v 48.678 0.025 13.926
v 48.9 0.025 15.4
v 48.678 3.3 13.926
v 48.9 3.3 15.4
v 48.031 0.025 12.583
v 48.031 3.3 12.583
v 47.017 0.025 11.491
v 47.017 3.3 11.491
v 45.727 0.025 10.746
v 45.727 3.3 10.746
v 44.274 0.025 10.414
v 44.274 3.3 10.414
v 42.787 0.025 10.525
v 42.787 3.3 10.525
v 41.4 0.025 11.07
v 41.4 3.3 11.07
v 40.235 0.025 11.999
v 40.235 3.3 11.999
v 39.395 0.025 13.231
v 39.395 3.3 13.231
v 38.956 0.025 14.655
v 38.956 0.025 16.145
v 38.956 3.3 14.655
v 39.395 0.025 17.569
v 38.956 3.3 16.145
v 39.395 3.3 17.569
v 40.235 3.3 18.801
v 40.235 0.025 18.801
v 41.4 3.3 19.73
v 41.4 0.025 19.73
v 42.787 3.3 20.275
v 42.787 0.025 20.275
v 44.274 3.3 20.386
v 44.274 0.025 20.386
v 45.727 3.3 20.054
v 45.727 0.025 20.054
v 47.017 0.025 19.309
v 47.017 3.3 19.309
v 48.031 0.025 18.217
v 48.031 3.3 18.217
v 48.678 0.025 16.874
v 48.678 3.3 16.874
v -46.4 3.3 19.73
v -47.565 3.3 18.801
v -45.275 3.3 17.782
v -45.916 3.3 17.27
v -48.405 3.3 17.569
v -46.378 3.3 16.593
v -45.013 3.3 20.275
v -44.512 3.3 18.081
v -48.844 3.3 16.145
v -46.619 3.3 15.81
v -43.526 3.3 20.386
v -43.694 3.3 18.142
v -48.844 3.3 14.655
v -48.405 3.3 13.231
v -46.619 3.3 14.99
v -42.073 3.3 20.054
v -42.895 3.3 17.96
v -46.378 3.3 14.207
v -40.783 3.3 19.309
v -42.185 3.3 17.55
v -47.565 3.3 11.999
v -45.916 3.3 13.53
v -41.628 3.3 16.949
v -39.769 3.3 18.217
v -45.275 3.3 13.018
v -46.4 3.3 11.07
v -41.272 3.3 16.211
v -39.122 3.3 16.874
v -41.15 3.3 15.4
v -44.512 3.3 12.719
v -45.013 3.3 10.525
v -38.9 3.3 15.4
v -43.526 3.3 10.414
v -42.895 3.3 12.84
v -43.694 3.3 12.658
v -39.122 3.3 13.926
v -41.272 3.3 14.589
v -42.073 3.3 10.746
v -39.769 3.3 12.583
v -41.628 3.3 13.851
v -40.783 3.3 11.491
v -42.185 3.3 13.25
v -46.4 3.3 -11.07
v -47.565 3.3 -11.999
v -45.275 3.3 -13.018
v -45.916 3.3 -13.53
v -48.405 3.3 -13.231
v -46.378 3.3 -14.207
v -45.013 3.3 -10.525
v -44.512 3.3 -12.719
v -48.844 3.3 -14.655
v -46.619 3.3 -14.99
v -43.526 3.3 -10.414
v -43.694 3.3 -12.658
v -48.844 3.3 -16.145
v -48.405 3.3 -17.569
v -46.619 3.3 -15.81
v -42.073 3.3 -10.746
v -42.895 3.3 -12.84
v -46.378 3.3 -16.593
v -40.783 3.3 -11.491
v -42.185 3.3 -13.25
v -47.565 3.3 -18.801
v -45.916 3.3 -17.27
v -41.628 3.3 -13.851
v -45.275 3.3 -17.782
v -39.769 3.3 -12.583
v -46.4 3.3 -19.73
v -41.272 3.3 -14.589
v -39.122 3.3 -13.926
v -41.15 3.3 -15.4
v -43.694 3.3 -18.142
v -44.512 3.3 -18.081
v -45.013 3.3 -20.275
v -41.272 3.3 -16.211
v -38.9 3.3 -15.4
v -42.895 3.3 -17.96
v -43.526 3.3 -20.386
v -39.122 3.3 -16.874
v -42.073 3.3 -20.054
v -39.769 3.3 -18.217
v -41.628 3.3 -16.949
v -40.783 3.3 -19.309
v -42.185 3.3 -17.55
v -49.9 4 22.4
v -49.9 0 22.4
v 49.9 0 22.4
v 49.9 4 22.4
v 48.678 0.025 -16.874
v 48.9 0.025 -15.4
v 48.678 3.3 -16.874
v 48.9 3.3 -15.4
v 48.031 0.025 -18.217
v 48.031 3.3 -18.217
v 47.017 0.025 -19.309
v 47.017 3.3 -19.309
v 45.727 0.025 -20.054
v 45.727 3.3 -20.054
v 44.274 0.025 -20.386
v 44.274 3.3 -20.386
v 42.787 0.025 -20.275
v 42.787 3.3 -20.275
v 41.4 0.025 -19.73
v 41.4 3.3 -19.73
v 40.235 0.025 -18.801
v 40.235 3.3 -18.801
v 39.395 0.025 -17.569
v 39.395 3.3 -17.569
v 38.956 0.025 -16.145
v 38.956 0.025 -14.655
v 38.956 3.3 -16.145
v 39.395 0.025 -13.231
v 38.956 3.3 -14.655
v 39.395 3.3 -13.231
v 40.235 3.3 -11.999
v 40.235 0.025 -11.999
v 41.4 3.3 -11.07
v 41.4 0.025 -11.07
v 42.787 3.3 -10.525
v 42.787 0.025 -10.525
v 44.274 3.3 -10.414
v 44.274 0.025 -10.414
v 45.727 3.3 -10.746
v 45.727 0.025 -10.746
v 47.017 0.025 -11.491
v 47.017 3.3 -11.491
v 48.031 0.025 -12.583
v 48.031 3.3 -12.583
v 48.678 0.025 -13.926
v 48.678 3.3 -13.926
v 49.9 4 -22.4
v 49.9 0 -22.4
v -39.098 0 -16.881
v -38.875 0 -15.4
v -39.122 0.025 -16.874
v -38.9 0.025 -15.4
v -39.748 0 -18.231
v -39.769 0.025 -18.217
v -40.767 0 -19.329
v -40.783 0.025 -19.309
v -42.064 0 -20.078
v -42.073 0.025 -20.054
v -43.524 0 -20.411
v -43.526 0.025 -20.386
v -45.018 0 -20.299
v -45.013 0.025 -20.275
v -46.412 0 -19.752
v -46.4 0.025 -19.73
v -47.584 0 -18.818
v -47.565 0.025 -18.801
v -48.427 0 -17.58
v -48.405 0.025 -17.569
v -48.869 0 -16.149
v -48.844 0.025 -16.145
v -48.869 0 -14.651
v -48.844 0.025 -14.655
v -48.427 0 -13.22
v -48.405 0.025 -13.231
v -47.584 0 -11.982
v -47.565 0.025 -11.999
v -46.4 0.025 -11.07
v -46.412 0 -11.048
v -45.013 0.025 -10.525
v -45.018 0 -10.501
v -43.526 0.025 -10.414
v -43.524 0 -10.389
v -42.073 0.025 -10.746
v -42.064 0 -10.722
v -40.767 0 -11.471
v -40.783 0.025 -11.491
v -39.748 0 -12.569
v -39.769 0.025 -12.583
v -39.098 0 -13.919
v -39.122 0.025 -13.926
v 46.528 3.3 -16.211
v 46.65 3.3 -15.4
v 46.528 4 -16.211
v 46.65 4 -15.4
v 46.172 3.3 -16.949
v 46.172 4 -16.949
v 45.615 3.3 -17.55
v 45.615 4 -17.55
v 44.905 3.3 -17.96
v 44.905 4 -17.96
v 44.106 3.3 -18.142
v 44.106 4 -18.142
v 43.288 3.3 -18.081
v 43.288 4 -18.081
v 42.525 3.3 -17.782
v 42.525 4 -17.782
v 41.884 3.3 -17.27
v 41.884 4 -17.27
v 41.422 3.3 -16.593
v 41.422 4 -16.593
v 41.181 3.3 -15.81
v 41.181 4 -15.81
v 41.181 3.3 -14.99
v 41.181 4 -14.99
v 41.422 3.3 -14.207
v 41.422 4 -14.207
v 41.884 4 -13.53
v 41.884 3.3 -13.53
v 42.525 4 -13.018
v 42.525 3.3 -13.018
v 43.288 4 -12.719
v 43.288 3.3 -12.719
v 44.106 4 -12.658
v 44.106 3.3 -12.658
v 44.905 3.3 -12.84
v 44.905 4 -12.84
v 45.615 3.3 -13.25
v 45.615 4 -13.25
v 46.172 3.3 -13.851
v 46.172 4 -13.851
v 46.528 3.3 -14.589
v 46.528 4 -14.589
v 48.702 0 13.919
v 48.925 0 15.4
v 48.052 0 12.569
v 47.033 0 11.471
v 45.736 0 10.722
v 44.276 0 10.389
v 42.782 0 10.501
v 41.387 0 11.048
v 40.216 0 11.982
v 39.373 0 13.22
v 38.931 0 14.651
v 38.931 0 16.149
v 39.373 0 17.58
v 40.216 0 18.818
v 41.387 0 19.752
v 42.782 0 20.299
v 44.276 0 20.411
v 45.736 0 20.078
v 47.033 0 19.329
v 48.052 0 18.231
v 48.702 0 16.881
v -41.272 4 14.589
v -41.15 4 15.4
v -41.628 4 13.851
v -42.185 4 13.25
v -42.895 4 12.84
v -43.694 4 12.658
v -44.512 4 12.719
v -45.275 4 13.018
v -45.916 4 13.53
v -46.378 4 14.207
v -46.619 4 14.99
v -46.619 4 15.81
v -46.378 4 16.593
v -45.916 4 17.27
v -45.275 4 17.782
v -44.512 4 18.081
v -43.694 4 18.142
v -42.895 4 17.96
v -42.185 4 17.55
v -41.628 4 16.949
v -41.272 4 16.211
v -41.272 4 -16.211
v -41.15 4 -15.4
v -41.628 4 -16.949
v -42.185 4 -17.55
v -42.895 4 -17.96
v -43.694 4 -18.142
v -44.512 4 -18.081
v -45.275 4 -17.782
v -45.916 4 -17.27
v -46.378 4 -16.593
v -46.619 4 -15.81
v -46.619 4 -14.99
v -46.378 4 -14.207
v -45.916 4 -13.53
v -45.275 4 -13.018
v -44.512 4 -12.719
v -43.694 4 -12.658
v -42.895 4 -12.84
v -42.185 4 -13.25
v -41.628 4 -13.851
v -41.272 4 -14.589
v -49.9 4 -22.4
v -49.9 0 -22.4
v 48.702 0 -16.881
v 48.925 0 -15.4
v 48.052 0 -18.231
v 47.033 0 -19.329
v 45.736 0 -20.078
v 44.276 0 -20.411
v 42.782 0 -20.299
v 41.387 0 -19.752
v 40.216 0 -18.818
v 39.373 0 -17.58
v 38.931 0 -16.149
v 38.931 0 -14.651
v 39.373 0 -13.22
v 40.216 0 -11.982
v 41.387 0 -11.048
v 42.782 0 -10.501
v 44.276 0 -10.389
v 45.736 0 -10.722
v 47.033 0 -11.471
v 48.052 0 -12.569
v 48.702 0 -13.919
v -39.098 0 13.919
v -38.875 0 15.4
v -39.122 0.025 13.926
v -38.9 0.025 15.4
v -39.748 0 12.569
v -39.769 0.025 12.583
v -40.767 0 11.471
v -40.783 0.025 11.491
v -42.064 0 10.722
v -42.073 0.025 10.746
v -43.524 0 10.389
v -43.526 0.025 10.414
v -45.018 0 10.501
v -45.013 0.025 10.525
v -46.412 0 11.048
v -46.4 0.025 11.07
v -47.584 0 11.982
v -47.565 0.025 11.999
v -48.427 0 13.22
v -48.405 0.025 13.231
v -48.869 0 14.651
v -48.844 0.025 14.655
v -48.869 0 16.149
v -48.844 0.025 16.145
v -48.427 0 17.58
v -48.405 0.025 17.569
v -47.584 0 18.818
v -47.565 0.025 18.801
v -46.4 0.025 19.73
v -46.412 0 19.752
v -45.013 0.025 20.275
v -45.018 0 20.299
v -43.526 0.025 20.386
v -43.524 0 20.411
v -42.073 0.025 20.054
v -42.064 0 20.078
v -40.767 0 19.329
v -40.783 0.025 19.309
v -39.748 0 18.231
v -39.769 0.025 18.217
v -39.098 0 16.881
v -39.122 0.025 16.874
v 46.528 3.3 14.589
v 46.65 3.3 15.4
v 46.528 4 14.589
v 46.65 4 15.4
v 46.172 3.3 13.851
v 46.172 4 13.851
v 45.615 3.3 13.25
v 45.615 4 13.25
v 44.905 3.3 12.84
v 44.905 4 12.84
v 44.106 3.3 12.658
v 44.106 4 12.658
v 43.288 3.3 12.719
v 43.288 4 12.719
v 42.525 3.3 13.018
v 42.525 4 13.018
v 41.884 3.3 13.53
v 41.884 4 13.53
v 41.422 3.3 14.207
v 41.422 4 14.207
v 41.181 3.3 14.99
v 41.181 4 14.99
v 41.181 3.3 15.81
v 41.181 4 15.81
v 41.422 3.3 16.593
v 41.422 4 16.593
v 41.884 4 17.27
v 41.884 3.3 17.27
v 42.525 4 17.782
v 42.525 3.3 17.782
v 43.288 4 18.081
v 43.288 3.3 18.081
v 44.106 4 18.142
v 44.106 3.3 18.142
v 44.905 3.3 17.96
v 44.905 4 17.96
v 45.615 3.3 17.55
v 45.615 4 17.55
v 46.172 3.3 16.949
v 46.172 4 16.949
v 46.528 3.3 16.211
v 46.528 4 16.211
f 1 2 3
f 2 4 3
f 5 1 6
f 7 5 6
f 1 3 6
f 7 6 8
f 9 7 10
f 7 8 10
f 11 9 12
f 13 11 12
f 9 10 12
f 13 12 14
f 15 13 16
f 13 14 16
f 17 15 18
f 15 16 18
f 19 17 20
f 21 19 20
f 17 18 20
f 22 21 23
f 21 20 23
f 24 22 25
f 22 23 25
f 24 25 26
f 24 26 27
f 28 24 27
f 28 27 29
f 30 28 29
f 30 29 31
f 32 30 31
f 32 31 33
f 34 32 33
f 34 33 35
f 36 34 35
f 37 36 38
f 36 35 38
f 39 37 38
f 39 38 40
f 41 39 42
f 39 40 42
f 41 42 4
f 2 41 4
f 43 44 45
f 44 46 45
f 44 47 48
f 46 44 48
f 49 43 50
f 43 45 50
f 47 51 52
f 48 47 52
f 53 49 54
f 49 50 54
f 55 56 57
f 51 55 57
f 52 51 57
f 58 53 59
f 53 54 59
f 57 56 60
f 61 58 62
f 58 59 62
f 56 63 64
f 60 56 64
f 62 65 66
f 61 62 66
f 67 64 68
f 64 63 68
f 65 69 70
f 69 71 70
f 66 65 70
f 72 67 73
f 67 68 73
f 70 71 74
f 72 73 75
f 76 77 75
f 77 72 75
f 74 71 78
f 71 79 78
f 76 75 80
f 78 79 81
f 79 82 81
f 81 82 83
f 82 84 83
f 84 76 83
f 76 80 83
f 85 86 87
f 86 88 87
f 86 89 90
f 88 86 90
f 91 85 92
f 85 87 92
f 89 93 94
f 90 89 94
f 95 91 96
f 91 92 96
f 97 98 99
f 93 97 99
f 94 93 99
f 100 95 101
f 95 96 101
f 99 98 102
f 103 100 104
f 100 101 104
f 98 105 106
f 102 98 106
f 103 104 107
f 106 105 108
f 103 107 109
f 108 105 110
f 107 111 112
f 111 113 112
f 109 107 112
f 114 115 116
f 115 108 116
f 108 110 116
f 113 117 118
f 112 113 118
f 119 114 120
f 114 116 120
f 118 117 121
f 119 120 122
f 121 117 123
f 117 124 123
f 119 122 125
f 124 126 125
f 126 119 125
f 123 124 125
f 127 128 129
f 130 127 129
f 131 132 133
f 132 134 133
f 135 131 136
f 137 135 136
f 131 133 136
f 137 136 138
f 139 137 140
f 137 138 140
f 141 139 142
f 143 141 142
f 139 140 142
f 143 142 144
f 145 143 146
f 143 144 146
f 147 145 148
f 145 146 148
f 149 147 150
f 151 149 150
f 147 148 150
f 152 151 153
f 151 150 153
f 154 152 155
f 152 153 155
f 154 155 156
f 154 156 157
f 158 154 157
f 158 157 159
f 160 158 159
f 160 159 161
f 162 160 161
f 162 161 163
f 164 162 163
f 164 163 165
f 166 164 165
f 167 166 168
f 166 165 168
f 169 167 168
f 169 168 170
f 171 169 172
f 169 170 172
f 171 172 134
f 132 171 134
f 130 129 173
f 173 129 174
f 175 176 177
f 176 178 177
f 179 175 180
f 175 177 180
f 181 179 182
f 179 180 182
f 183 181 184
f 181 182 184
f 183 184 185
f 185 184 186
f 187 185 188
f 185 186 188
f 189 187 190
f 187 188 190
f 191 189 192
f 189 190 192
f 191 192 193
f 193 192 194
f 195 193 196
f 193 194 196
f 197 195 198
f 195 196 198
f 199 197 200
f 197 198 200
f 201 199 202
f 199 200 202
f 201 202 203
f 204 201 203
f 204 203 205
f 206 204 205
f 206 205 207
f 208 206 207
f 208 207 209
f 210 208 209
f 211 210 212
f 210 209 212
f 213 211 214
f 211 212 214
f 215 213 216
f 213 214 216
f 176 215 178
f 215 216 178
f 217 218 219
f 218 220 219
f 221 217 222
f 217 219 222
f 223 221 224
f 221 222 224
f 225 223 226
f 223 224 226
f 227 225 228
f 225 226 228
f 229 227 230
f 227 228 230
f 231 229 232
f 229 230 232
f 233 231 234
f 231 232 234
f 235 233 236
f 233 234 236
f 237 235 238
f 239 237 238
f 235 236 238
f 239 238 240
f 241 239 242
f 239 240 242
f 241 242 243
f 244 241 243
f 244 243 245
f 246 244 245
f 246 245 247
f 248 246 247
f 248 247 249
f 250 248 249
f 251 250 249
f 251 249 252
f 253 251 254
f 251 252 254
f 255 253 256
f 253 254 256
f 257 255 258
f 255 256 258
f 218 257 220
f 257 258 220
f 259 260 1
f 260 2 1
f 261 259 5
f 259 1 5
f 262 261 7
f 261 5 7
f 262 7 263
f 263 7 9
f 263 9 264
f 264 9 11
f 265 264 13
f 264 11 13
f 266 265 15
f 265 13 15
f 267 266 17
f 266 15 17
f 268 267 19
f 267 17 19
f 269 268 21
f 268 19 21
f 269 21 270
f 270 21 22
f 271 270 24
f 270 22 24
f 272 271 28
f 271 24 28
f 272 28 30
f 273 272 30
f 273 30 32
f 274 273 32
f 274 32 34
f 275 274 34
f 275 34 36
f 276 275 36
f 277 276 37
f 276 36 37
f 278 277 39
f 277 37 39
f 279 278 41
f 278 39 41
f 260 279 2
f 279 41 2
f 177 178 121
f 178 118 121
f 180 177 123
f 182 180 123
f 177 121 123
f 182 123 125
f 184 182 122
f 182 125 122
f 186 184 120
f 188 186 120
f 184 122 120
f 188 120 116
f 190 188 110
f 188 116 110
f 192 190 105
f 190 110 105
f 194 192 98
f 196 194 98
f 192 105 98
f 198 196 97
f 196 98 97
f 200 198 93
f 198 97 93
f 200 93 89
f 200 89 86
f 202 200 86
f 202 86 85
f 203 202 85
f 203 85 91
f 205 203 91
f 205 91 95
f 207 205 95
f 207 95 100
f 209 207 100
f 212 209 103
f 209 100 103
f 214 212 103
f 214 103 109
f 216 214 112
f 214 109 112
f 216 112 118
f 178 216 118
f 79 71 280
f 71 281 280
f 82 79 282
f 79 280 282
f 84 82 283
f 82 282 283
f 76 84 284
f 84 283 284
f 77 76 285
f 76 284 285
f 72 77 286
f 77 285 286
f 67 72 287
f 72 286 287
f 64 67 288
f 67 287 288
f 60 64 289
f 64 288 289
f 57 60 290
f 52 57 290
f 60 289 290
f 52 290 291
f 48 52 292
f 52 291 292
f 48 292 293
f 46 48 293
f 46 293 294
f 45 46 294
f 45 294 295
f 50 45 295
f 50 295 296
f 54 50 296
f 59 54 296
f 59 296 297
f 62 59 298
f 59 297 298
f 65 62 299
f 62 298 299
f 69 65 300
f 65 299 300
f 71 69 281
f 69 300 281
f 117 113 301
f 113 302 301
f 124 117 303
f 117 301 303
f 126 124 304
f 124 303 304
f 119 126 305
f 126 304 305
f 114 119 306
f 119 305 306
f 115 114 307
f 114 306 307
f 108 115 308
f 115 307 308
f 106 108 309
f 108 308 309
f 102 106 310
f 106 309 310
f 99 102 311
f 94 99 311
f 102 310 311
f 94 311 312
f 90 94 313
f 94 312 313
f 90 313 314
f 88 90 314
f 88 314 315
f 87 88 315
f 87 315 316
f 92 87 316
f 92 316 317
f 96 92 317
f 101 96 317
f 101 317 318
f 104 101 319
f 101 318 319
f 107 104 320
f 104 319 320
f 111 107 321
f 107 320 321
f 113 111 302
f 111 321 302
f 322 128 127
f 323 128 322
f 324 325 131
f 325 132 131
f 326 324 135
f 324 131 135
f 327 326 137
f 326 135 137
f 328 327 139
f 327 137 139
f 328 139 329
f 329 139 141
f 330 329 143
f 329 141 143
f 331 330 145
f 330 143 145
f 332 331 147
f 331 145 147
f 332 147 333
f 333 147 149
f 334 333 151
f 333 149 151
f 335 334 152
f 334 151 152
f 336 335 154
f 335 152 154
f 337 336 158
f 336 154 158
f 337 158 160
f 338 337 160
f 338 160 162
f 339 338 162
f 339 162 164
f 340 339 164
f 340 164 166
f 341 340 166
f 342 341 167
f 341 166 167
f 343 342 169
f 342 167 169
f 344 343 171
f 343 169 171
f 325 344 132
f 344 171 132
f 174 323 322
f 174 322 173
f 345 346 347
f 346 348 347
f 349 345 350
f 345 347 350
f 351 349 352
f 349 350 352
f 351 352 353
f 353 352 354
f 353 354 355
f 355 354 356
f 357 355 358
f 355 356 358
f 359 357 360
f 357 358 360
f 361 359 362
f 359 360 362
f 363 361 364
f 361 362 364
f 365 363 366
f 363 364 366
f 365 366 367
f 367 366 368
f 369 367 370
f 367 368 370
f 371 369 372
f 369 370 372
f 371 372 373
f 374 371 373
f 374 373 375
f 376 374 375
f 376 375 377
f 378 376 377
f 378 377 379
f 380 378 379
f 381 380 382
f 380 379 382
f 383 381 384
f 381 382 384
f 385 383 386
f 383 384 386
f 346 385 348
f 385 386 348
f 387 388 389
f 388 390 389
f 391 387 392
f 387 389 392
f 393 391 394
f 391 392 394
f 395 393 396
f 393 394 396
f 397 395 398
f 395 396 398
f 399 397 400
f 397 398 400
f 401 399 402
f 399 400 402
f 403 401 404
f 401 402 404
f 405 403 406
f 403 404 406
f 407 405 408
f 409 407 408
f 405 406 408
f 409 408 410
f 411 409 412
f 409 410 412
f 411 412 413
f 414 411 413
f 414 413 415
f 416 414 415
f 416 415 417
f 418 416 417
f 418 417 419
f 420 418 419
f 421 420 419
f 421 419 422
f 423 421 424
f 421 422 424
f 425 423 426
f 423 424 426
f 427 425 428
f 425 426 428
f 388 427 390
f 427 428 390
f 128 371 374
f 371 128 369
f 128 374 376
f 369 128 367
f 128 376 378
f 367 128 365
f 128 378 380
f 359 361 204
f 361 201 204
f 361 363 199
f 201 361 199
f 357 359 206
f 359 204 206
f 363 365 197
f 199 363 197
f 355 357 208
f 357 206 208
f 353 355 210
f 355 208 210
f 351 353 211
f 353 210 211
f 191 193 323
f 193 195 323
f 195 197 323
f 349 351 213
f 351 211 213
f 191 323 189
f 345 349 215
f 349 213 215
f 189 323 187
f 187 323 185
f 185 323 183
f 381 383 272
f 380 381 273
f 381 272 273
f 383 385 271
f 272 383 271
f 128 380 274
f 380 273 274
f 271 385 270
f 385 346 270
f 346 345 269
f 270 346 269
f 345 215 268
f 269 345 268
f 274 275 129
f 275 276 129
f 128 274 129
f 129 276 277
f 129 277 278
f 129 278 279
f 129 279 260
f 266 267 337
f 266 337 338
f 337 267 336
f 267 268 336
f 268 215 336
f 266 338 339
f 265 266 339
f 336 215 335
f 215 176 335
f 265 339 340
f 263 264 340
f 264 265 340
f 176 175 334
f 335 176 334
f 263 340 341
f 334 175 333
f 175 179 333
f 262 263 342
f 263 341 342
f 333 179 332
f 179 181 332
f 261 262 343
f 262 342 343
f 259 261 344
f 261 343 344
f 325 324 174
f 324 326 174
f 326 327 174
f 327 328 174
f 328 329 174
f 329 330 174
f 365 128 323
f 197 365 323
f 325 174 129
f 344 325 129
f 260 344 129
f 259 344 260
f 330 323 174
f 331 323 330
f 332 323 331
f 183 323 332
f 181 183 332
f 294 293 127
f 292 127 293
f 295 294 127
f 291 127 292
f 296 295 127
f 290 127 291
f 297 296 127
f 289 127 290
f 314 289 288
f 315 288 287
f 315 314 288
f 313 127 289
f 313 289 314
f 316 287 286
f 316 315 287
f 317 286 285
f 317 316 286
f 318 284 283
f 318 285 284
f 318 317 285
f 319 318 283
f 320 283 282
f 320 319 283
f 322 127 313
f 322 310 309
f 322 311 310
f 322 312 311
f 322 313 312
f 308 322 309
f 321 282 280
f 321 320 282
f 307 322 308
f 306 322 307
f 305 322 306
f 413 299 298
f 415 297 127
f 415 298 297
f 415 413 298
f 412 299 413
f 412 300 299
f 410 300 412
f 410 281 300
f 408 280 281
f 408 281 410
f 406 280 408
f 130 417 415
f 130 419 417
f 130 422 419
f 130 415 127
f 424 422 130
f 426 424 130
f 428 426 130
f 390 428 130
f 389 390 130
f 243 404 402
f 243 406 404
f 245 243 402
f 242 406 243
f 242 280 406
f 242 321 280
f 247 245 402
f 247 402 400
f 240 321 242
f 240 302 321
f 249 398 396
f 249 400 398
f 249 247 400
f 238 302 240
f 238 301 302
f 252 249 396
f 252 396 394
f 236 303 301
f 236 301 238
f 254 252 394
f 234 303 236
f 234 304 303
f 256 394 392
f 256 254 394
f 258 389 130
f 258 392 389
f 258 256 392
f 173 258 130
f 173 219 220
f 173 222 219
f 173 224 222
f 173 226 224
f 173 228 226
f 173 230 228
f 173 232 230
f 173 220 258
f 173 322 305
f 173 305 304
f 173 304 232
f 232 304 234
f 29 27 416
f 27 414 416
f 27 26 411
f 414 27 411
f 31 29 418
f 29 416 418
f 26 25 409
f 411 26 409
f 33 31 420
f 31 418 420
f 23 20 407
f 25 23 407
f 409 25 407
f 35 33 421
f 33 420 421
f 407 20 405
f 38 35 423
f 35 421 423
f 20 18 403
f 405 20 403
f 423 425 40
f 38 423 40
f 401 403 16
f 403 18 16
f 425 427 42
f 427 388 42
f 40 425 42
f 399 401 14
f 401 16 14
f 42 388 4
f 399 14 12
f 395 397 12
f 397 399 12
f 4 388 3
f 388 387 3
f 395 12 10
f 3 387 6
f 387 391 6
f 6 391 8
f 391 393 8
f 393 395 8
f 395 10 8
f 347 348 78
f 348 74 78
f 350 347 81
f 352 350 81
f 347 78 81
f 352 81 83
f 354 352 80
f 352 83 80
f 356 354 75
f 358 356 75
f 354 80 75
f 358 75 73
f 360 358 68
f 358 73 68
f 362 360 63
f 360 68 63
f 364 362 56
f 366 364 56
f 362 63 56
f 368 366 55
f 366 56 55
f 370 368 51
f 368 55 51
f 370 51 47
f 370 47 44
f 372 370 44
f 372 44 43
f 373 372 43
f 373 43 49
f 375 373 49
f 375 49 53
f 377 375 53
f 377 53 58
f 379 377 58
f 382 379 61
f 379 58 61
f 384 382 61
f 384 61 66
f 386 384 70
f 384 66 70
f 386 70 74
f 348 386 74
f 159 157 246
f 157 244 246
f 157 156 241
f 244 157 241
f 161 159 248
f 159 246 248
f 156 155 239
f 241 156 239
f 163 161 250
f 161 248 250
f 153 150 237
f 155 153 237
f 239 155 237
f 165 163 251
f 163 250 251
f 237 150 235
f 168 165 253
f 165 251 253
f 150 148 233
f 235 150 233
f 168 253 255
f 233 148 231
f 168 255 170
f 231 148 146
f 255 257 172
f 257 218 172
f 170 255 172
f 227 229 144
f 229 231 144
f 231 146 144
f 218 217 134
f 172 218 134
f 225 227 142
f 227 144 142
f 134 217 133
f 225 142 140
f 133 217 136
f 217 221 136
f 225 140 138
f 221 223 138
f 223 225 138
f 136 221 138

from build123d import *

# Parameters (mm, degrees)
SKETCH_1_W      = 99.8
SKETCH_1_H      = 44.8
EXTRUDE_1_DEPTH = 4


# Read off the part's stored shape, not the designer's step: M5 扁圆形螺钉的柱孔
with BuildPart() as part:
    # 草图1 → 凸台-拉伸1 (new body)
    with BuildSketch(Plane(origin=(0, 0, 0), x_dir=(1, 0, 0), z_dir=(0, 1, 0))):
        Rectangle(SKETCH_1_W, SKETCH_1_H)
    extrude(amount=EXTRUDE_1_DEPTH)

    # M5 扁圆形螺钉的柱孔 outline → M5 扁圆形螺钉的柱孔 (revolve, cut)
    with BuildSketch(Plane(origin=(43.9, 0, -15.4), x_dir=(1, 0, 0), z_dir=(0, 0, 1))):
        Polygon((2.75, 3.3), (2.75, 4), (0, 4), (0, 0), (5.025, 0), (5, 0.025), (5, 3.3), align=None)
    revolve(axis=Axis((43.9, 0, -15.4), (0, 1, 0)), mode=Mode.SUBTRACT)

    # Hole Wizard M5 2 outline → Hole Wizard M5 2 (revolve, cut)
    with BuildSketch(Plane(origin=(43.9, 0, 15.4), x_dir=(1, 0, 0), z_dir=(0, 0, 1))):
        Polygon((0, 0), (5.025, 0), (5, 0.025), (5, 3.3), (2.75, 3.3), (2.75, 4), (0, 4), align=None)
    revolve(axis=Axis((43.9, 0, 15.4), (0, 1, 0)), mode=Mode.SUBTRACT)

    # Hole Wizard M5 3 outline → Hole Wizard M5 3 (revolve, cut)
    with BuildSketch(Plane(origin=(-43.9, 0, 15.4), x_dir=(1, 0, 0), z_dir=(0, 0, 1))):
        Polygon((0, 0), (5.025, 0), (5, 0.025), (5, 3.3), (2.75, 3.3), (2.75, 4), (0, 4), align=None)
    revolve(axis=Axis((-43.9, 0, 15.4), (0, 1, 0)), mode=Mode.SUBTRACT)

    # Hole Wizard M5 4 outline → Hole Wizard M5 4 (revolve, cut)
    with BuildSketch(Plane(origin=(-43.9, 0, -15.4), x_dir=(1, 0, 0), z_dir=(0, 0, 1))):
        Polygon((0, 0), (5.025, 0), (5, 0.025), (5, 3.3), (2.75, 3.3), (2.75, 4), (0, 4), align=None)
    revolve(axis=Axis((-43.9, 0, -15.4), (0, 1, 0)), mode=Mode.SUBTRACT)


solid = part.part
